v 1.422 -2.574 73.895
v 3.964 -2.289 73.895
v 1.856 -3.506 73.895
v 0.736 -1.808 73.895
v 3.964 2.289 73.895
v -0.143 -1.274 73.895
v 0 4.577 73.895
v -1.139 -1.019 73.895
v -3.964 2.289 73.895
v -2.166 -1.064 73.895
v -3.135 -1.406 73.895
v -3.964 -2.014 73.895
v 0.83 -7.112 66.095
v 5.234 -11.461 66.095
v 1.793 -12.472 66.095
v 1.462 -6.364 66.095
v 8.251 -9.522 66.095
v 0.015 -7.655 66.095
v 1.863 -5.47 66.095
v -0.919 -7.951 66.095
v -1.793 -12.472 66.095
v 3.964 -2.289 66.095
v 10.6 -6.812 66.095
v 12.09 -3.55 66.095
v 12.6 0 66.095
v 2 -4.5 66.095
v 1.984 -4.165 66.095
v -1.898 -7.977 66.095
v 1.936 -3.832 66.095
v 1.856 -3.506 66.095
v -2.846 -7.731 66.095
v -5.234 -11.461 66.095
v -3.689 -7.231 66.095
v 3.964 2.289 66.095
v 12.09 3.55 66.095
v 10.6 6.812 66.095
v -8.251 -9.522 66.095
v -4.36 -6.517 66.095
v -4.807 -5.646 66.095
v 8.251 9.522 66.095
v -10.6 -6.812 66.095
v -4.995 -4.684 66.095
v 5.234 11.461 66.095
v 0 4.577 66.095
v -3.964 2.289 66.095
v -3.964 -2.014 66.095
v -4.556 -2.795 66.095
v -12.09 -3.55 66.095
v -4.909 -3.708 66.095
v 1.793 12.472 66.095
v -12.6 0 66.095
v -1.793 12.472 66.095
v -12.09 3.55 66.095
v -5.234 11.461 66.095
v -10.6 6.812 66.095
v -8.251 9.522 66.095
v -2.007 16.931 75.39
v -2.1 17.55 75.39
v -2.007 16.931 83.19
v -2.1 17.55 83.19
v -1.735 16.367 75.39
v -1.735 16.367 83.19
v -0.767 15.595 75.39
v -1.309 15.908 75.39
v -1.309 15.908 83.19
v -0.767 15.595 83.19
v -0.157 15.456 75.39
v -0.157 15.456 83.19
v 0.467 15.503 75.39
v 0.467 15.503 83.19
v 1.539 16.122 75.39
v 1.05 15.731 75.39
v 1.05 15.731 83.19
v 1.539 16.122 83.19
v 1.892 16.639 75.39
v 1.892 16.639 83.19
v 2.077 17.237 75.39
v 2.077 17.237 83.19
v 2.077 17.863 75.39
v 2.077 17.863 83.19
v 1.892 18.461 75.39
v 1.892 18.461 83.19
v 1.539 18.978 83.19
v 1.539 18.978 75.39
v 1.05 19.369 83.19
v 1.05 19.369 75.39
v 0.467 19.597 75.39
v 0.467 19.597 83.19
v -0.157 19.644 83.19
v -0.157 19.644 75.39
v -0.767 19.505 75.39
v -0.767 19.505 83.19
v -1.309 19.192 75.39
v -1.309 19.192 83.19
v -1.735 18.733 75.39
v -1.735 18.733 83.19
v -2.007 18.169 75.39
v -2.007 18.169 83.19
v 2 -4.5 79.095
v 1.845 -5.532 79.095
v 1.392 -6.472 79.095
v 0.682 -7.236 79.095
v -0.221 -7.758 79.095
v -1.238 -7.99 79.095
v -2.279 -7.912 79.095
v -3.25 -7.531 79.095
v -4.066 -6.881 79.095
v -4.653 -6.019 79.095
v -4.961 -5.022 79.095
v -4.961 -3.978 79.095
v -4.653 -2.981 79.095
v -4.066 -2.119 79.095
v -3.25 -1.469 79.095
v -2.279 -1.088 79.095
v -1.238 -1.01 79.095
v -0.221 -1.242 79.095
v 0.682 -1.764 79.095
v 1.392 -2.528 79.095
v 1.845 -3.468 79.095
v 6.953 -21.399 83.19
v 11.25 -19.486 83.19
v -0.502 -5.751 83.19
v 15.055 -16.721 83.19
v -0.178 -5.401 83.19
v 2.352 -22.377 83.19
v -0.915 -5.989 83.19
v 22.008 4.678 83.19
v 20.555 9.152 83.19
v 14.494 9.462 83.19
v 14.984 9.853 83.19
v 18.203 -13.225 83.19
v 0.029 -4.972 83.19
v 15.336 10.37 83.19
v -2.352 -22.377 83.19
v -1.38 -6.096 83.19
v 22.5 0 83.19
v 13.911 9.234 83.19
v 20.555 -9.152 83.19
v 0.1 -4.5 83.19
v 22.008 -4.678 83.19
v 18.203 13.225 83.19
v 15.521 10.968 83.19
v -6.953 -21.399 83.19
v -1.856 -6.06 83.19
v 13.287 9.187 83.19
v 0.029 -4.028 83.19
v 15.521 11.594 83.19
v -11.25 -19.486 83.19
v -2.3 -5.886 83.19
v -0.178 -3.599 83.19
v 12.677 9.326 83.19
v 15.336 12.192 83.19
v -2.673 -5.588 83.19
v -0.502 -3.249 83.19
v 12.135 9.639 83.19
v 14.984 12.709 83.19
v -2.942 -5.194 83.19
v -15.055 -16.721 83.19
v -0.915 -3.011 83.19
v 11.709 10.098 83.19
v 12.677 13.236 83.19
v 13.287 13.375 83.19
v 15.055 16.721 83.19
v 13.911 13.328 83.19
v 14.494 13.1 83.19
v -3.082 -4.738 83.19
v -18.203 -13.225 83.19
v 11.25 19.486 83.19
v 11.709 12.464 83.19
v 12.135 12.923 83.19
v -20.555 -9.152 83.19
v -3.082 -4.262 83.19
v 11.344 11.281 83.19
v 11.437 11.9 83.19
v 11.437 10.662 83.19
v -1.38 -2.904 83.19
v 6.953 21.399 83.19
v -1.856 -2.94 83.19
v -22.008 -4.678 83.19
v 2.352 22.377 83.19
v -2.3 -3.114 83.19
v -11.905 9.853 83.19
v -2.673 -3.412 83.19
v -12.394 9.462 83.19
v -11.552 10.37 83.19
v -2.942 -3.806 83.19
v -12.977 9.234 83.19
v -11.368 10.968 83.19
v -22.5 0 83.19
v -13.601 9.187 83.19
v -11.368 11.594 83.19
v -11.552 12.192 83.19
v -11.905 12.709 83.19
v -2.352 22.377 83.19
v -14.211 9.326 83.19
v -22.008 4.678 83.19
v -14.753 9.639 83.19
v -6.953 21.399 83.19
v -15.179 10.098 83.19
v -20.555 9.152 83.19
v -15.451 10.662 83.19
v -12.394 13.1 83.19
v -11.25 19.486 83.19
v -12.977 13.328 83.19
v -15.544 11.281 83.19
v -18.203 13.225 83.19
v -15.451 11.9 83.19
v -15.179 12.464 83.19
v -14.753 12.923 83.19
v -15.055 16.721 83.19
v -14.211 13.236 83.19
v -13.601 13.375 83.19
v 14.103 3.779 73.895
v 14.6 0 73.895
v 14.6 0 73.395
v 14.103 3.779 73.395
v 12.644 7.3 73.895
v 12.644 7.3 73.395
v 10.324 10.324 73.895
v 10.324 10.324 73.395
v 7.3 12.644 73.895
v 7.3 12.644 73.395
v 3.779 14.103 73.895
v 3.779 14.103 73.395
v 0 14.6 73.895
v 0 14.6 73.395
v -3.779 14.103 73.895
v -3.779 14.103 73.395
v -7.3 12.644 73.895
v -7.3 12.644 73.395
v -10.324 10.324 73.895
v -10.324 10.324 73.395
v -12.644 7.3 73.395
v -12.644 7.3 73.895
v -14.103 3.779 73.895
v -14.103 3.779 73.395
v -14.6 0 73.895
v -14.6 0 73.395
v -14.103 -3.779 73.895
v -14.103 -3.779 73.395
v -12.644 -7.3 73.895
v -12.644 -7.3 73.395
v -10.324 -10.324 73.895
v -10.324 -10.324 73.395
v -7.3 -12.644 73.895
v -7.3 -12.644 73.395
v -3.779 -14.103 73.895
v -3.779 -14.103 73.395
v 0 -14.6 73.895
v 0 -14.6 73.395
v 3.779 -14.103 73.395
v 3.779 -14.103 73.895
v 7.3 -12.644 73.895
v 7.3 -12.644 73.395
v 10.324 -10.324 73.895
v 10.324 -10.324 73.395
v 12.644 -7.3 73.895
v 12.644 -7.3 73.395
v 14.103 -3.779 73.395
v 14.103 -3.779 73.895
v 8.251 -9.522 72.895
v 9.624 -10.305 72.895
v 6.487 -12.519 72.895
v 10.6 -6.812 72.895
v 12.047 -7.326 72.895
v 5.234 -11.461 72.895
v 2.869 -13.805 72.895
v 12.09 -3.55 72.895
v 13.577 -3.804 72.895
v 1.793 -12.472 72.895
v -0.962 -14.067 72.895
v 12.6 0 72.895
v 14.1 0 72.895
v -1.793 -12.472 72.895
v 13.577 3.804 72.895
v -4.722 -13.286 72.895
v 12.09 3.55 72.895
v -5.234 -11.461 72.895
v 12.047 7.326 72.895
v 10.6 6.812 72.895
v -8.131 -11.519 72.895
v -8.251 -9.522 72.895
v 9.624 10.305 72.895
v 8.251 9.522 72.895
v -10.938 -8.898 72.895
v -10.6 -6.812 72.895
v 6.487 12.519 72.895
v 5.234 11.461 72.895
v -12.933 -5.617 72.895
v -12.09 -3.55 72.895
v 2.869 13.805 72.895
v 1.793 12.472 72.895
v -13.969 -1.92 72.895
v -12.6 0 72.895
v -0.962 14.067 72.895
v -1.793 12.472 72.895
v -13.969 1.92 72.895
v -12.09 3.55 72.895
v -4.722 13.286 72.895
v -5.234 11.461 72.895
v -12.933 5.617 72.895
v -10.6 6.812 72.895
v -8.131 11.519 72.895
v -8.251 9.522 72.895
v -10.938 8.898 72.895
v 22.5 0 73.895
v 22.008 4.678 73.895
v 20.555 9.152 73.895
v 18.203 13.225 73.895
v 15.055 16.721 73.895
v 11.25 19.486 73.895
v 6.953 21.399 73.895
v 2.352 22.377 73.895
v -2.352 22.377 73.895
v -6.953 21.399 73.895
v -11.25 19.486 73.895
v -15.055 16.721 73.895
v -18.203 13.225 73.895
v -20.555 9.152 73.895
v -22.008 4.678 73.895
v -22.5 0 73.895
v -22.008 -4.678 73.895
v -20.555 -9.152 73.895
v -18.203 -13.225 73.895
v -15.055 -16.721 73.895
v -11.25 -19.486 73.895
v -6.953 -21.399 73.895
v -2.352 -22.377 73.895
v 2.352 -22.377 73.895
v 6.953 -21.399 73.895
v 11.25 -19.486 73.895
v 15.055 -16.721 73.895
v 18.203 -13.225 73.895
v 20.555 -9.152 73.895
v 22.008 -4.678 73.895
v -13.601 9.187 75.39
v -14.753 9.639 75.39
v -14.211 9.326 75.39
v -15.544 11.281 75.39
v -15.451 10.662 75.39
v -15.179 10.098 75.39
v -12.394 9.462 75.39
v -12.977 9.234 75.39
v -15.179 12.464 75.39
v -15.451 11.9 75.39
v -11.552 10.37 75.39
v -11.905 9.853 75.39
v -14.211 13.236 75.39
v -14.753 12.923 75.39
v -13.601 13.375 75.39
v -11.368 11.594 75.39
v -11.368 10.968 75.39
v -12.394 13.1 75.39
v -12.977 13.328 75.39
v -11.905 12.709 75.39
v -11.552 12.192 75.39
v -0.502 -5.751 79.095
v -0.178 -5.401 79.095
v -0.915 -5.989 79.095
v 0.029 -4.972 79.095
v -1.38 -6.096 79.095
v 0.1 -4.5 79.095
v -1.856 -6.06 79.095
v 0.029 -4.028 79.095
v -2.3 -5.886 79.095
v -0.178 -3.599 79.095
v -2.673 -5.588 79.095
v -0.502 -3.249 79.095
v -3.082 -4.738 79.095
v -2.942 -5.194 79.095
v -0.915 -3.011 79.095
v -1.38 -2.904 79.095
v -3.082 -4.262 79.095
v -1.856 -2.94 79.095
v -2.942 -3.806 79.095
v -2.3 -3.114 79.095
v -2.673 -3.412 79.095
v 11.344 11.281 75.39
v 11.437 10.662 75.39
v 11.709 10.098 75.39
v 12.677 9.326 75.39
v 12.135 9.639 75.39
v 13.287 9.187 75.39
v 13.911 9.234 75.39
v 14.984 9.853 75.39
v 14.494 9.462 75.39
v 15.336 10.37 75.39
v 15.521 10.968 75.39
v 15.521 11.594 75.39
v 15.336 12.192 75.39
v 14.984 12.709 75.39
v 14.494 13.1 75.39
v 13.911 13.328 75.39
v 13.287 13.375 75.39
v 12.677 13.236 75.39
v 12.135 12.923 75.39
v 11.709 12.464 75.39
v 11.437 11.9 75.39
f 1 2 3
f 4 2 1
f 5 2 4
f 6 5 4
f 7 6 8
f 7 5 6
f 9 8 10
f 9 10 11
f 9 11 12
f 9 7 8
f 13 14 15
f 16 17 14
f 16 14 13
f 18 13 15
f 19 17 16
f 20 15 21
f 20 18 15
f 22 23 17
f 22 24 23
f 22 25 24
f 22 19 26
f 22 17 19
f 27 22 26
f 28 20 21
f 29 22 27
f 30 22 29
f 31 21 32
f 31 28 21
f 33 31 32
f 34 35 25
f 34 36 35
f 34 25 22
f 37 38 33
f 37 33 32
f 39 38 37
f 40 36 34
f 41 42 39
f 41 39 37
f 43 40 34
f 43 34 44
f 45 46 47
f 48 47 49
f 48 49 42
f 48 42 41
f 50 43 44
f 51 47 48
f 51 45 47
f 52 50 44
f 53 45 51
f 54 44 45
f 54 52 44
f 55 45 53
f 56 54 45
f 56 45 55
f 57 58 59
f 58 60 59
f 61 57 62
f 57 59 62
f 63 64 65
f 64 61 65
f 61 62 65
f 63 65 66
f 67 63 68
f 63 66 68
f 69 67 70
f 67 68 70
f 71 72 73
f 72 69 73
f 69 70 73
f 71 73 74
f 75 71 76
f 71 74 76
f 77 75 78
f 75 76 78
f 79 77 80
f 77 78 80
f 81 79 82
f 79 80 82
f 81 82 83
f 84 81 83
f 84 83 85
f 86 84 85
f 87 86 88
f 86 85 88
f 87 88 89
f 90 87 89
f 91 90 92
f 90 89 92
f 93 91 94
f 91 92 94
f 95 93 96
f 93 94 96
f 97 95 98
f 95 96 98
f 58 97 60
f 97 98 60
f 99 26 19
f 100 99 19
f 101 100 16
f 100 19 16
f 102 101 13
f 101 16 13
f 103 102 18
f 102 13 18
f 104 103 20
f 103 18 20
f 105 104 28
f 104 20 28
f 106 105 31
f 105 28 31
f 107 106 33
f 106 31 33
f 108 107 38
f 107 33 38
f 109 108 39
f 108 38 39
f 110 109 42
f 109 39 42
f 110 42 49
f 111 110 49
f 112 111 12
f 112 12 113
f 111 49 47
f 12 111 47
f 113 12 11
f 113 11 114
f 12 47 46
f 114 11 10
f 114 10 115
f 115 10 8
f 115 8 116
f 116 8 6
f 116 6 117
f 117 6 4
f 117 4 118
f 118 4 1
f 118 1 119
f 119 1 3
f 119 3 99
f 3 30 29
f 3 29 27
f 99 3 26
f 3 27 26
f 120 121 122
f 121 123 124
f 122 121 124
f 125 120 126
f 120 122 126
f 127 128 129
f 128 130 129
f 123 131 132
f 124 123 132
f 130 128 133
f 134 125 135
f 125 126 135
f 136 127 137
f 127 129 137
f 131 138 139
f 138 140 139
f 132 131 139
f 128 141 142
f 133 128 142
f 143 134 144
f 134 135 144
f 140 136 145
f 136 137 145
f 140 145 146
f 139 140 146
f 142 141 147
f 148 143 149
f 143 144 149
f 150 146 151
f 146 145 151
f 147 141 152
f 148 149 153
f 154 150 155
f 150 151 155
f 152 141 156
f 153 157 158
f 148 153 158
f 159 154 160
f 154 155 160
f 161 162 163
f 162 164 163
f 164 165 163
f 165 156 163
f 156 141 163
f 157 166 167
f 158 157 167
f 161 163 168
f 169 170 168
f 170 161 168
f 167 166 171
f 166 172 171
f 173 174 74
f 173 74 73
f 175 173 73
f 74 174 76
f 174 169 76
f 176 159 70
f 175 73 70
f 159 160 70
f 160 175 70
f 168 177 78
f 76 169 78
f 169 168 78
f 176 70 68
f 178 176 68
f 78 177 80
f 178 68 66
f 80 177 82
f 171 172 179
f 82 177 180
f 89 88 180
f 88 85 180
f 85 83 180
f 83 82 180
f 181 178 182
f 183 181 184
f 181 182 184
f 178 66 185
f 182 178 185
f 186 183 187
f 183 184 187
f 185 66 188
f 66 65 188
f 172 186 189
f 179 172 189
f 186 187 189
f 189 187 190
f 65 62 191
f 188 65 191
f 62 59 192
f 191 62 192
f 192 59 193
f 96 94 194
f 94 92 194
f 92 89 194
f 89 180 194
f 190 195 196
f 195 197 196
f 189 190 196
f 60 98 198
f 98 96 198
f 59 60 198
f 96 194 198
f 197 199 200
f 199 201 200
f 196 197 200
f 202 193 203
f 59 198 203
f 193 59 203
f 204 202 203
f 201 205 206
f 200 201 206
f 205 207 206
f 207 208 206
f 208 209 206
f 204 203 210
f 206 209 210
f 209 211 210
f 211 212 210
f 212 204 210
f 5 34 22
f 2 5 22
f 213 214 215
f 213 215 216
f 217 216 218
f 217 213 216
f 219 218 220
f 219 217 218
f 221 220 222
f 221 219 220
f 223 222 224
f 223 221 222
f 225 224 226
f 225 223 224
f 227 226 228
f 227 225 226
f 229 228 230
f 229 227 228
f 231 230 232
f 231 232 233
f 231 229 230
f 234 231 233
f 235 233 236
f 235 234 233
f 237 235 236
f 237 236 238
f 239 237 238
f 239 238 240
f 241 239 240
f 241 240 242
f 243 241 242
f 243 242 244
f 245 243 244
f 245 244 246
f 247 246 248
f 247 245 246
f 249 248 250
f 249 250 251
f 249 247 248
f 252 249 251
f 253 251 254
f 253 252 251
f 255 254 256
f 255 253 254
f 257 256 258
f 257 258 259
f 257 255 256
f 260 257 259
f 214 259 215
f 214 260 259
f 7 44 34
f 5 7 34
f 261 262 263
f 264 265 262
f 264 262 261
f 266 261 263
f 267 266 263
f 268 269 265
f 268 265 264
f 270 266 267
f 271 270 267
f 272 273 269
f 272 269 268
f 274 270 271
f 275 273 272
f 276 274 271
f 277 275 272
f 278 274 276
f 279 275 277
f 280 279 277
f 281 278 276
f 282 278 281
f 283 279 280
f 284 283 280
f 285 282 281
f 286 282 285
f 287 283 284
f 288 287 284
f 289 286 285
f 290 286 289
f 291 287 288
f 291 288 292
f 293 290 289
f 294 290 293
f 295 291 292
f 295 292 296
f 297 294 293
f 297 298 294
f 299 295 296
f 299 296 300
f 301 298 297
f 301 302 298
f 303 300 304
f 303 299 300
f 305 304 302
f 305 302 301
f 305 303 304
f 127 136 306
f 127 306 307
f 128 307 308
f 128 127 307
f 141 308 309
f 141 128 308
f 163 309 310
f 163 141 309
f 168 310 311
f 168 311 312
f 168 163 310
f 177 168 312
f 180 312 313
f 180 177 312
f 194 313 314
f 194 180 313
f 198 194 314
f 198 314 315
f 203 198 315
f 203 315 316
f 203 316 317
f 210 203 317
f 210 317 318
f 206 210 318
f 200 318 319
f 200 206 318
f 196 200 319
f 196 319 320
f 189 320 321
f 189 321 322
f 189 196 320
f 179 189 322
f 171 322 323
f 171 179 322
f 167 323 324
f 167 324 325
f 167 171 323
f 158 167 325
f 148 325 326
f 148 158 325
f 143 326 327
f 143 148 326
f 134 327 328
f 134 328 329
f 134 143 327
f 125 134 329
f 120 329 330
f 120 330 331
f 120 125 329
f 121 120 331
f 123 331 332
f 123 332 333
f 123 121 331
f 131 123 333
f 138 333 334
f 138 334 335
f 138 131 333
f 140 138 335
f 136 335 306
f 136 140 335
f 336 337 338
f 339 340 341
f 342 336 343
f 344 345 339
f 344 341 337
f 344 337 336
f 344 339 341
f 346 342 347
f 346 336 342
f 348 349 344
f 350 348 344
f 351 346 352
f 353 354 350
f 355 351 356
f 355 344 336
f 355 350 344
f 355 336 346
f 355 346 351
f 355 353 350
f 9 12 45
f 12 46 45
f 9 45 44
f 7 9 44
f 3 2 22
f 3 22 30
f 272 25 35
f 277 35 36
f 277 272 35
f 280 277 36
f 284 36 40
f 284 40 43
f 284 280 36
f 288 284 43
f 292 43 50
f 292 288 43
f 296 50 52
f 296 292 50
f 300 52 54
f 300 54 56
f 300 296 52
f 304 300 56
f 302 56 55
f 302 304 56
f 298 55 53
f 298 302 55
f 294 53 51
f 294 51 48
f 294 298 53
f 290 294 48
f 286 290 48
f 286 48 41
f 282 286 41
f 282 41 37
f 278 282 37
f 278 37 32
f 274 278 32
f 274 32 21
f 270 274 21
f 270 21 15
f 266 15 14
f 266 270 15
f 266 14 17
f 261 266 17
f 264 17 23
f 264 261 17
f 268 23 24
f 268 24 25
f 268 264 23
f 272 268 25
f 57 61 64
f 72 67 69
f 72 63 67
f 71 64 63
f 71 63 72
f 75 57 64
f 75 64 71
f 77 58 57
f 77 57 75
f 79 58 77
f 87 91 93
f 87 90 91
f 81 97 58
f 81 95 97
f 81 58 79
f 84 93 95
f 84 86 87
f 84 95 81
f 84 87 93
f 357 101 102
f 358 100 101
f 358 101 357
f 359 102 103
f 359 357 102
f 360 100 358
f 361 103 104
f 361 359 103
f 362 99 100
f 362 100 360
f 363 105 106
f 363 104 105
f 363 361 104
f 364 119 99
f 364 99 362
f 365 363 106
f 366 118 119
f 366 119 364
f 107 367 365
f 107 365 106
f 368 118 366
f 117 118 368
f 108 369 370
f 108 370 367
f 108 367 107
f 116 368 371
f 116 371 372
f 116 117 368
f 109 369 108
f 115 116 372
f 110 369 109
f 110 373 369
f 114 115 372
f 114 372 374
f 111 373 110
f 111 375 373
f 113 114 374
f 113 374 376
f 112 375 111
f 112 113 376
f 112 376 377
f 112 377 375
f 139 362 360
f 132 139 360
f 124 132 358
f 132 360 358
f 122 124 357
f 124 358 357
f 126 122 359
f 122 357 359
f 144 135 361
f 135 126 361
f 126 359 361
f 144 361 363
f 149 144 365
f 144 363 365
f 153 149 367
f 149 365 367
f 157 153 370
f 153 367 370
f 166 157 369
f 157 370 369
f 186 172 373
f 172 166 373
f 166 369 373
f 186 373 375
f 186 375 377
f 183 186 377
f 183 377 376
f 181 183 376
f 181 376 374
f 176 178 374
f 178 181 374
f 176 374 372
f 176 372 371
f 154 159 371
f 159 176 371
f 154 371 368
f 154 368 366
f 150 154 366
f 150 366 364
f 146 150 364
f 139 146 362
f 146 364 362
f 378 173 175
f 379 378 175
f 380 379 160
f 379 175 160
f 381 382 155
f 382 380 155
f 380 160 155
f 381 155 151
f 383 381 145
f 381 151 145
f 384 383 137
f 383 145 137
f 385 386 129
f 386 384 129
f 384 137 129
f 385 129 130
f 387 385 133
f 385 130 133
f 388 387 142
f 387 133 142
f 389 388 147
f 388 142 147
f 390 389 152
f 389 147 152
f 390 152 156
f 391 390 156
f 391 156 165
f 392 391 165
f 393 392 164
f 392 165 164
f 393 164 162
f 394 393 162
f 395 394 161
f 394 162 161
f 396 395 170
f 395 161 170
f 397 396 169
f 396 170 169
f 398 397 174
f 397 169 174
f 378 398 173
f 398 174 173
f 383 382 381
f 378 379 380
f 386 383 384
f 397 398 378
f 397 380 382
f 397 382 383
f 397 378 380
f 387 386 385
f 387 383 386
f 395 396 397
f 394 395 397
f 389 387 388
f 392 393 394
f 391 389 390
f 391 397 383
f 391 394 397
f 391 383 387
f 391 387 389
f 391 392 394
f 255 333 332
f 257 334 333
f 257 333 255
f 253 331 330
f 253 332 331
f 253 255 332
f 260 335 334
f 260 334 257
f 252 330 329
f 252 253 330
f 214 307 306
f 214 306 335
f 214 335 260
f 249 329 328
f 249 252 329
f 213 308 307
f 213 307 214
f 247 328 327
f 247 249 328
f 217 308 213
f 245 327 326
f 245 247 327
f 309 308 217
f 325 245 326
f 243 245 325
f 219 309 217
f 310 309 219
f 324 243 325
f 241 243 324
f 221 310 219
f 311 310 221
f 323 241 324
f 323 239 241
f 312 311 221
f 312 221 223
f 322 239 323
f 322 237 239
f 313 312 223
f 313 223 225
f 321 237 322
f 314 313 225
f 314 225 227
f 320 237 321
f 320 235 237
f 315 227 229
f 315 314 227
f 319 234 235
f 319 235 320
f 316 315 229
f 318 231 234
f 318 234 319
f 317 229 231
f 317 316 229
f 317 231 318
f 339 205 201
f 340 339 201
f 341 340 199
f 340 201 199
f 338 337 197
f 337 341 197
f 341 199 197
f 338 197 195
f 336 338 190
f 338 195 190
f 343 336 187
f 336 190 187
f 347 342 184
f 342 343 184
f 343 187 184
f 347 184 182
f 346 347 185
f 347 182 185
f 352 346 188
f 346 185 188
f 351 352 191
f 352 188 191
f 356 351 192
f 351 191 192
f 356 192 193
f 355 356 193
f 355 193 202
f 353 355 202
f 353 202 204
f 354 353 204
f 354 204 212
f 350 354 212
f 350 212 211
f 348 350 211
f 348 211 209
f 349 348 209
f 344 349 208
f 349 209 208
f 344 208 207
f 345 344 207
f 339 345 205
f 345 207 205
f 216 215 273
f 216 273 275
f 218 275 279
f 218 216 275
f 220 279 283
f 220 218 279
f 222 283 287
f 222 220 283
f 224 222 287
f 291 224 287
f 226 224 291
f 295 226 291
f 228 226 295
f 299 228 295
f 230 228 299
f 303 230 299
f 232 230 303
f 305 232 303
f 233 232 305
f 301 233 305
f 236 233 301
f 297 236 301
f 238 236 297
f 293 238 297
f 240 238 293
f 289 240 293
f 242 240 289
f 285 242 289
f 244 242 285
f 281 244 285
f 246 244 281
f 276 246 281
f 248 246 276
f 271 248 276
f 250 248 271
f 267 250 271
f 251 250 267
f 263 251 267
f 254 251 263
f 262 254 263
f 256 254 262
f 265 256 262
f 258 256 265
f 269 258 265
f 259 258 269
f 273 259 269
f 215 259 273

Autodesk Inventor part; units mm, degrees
ref_plane "YZ Plane" through (0, 0, 0) normal (1, 0, 0) x (0, 1, 0)
ref_plane "XZ Plane" through (0, 0, 0) normal (0, 1, 0) x (-1, 0, 0)
ref_plane "XY Plane" through (0, 0, 0) normal (0, 0, 1) x (1, 0, 0)
sketch "Эскиз1" plane through (0, 0, 0) normal (0, 0, 1) x (1, 0, 0)
  circle A0 centre (0, 0) radius 22.5
  dimension "d0" = 45
extrude "Выдавливание1" add sketch "Эскиз1" along normal blind 9.295
sketch "Эскиз2" plane through (0, 0, 9.295) normal (0, 0, 1) x (1, 0, 0)
  circle A0 centre (0, 0) radius 12.6
  dimension "d3" = 25.2
extrude "Выдавливание2" add sketch "Эскиз2" along normal blind 7.8
sketch "Эскиз3" plane through (0, 0, 9.295) normal (0, 0, 1) x (1, 0, 0)
  circle A0 centre (0, 0) radius 12.6 projected
  circle A1 centre (0, 0) radius 22.5 projected
  circle A2 centre (0, 0) radius 14.6
  dimension "d6" = 2
extrude "Выдавливание3" add sketch "Эскиз3" along normal blind 1 contours A2
chamfer "Фаска1" distance 0.5 angle 45 1 edges at (-14.6, 0, 10.295)
sketch "Эскиз4" plane through (0, 0, 17.095) normal (0, 0, 1) x (1, 0, 0)
  line L0 (0, 0) -> (0, 4)
  line L1 (0, 4) -> (3.4641, 2)
  line L2 (3.4641, 2) -> (3.4641, -2)
  line L3 (3.4641, -2) -> (0, -4)
  line L4 (0, -4) -> (-3.4641, -2)
  line L5 (-3.4641, -2) -> (-3.4641, 2)
  line L6 (-3.4641, 2) -> (0, 4)
  line L7 (3.9641, 2.2887) -> (0, 4.5774)
  line L8 (0, 4.5774) -> (-3.9641, 2.2887)
  line L9 (-3.9641, 2.2887) -> (-3.9641, -2.2887)
  line L10 (-3.9641, -2.2887) -> (0, -4.5774)
  line L11 (0, -4.5774) -> (3.9641, -2.2887)
  line L12 (3.9641, -2.2887) -> (3.9641, 2.2887)
  dimension "d12" = 4
  dimension "d13" = 0.5
extrude "Выдавливание4" cut sketch "Эскиз4" against normal blind 7.8 contours L1 L2 L3 L4 L5 L6 | L12 L11 L10 L9 L8 L7
sketch "Эскиз5" plane through (0, 0, 0) normal (0, 0, -1) x (-1, 0, 0)
  circle A0 centre (13.4441, 11.2809) radius 1.5 projected
  circle A1 centre (0, 17.55) radius 1.5 projected
  circle A2 centre (-13.4441, 11.2809) radius 1.5 projected
  circle A3 centre (13.4441, 11.2809) radius 2.1
  circle A4 centre (0, 17.55) radius 2.1
  circle A5 centre (-13.4441, 11.2809) radius 2.1
  point P0 (0, 0)
  dimension "d16" = 4.2
  dimension "d17" = 4.2
  dimension "d18" = 4.2
extrude "Выдавливание5" cut sketch "Эскиз5" against normal blind 7.8 contours A0 | A1 | A2 | A3 | A4 | A5
sketch "Эскиз6" plane through (0, 0, 17.095) normal (0, 0, 1) x (1, 0, 0)
  circle A0 centre (-1.5, -4.5) radius 1.5 projected
  circle A1 centre (-1.5, -4.5) radius 3.5
  point P0 (0, 0)
  dimension "d21" = 7
extrude "Выдавливание6" cut sketch "Эскиз6" against normal blind 13 contours A0 | A1
sketch "Эскиз7" plane through (-1.5, -4.5, 4.095) normal (0, 0, 1) x (1, 0, 0)
  circle A0 centre (0, 0) radius 3.5 projected
  circle A1 centre (0, 0) radius 1.6
  point P0 (1.5, 4.5)
  dimension "d24" = 3.2
extrude "Выдавливание7" cut sketch "Эскиз7" against normal blind 13 contours A1
ref_plane "РабПлоскость1" through (0, 0, 41.595) normal (0, 0, 1) x (1, 0, 0)
mirror "Зеркальное отражение1" about plane through (0, 0, 41.595) normal (0, 0, 1)
sketch "Эскиз8" plane through (0, 0, 0) normal (0, 0, -1) x (-1, 0, 0)
  circle A0 centre (0, 0) radius 38.8283
extrude "Выдавливание8" cut sketch "Эскиз8" against normal blind 20
properties part number "wheel_fixator_mirror"
